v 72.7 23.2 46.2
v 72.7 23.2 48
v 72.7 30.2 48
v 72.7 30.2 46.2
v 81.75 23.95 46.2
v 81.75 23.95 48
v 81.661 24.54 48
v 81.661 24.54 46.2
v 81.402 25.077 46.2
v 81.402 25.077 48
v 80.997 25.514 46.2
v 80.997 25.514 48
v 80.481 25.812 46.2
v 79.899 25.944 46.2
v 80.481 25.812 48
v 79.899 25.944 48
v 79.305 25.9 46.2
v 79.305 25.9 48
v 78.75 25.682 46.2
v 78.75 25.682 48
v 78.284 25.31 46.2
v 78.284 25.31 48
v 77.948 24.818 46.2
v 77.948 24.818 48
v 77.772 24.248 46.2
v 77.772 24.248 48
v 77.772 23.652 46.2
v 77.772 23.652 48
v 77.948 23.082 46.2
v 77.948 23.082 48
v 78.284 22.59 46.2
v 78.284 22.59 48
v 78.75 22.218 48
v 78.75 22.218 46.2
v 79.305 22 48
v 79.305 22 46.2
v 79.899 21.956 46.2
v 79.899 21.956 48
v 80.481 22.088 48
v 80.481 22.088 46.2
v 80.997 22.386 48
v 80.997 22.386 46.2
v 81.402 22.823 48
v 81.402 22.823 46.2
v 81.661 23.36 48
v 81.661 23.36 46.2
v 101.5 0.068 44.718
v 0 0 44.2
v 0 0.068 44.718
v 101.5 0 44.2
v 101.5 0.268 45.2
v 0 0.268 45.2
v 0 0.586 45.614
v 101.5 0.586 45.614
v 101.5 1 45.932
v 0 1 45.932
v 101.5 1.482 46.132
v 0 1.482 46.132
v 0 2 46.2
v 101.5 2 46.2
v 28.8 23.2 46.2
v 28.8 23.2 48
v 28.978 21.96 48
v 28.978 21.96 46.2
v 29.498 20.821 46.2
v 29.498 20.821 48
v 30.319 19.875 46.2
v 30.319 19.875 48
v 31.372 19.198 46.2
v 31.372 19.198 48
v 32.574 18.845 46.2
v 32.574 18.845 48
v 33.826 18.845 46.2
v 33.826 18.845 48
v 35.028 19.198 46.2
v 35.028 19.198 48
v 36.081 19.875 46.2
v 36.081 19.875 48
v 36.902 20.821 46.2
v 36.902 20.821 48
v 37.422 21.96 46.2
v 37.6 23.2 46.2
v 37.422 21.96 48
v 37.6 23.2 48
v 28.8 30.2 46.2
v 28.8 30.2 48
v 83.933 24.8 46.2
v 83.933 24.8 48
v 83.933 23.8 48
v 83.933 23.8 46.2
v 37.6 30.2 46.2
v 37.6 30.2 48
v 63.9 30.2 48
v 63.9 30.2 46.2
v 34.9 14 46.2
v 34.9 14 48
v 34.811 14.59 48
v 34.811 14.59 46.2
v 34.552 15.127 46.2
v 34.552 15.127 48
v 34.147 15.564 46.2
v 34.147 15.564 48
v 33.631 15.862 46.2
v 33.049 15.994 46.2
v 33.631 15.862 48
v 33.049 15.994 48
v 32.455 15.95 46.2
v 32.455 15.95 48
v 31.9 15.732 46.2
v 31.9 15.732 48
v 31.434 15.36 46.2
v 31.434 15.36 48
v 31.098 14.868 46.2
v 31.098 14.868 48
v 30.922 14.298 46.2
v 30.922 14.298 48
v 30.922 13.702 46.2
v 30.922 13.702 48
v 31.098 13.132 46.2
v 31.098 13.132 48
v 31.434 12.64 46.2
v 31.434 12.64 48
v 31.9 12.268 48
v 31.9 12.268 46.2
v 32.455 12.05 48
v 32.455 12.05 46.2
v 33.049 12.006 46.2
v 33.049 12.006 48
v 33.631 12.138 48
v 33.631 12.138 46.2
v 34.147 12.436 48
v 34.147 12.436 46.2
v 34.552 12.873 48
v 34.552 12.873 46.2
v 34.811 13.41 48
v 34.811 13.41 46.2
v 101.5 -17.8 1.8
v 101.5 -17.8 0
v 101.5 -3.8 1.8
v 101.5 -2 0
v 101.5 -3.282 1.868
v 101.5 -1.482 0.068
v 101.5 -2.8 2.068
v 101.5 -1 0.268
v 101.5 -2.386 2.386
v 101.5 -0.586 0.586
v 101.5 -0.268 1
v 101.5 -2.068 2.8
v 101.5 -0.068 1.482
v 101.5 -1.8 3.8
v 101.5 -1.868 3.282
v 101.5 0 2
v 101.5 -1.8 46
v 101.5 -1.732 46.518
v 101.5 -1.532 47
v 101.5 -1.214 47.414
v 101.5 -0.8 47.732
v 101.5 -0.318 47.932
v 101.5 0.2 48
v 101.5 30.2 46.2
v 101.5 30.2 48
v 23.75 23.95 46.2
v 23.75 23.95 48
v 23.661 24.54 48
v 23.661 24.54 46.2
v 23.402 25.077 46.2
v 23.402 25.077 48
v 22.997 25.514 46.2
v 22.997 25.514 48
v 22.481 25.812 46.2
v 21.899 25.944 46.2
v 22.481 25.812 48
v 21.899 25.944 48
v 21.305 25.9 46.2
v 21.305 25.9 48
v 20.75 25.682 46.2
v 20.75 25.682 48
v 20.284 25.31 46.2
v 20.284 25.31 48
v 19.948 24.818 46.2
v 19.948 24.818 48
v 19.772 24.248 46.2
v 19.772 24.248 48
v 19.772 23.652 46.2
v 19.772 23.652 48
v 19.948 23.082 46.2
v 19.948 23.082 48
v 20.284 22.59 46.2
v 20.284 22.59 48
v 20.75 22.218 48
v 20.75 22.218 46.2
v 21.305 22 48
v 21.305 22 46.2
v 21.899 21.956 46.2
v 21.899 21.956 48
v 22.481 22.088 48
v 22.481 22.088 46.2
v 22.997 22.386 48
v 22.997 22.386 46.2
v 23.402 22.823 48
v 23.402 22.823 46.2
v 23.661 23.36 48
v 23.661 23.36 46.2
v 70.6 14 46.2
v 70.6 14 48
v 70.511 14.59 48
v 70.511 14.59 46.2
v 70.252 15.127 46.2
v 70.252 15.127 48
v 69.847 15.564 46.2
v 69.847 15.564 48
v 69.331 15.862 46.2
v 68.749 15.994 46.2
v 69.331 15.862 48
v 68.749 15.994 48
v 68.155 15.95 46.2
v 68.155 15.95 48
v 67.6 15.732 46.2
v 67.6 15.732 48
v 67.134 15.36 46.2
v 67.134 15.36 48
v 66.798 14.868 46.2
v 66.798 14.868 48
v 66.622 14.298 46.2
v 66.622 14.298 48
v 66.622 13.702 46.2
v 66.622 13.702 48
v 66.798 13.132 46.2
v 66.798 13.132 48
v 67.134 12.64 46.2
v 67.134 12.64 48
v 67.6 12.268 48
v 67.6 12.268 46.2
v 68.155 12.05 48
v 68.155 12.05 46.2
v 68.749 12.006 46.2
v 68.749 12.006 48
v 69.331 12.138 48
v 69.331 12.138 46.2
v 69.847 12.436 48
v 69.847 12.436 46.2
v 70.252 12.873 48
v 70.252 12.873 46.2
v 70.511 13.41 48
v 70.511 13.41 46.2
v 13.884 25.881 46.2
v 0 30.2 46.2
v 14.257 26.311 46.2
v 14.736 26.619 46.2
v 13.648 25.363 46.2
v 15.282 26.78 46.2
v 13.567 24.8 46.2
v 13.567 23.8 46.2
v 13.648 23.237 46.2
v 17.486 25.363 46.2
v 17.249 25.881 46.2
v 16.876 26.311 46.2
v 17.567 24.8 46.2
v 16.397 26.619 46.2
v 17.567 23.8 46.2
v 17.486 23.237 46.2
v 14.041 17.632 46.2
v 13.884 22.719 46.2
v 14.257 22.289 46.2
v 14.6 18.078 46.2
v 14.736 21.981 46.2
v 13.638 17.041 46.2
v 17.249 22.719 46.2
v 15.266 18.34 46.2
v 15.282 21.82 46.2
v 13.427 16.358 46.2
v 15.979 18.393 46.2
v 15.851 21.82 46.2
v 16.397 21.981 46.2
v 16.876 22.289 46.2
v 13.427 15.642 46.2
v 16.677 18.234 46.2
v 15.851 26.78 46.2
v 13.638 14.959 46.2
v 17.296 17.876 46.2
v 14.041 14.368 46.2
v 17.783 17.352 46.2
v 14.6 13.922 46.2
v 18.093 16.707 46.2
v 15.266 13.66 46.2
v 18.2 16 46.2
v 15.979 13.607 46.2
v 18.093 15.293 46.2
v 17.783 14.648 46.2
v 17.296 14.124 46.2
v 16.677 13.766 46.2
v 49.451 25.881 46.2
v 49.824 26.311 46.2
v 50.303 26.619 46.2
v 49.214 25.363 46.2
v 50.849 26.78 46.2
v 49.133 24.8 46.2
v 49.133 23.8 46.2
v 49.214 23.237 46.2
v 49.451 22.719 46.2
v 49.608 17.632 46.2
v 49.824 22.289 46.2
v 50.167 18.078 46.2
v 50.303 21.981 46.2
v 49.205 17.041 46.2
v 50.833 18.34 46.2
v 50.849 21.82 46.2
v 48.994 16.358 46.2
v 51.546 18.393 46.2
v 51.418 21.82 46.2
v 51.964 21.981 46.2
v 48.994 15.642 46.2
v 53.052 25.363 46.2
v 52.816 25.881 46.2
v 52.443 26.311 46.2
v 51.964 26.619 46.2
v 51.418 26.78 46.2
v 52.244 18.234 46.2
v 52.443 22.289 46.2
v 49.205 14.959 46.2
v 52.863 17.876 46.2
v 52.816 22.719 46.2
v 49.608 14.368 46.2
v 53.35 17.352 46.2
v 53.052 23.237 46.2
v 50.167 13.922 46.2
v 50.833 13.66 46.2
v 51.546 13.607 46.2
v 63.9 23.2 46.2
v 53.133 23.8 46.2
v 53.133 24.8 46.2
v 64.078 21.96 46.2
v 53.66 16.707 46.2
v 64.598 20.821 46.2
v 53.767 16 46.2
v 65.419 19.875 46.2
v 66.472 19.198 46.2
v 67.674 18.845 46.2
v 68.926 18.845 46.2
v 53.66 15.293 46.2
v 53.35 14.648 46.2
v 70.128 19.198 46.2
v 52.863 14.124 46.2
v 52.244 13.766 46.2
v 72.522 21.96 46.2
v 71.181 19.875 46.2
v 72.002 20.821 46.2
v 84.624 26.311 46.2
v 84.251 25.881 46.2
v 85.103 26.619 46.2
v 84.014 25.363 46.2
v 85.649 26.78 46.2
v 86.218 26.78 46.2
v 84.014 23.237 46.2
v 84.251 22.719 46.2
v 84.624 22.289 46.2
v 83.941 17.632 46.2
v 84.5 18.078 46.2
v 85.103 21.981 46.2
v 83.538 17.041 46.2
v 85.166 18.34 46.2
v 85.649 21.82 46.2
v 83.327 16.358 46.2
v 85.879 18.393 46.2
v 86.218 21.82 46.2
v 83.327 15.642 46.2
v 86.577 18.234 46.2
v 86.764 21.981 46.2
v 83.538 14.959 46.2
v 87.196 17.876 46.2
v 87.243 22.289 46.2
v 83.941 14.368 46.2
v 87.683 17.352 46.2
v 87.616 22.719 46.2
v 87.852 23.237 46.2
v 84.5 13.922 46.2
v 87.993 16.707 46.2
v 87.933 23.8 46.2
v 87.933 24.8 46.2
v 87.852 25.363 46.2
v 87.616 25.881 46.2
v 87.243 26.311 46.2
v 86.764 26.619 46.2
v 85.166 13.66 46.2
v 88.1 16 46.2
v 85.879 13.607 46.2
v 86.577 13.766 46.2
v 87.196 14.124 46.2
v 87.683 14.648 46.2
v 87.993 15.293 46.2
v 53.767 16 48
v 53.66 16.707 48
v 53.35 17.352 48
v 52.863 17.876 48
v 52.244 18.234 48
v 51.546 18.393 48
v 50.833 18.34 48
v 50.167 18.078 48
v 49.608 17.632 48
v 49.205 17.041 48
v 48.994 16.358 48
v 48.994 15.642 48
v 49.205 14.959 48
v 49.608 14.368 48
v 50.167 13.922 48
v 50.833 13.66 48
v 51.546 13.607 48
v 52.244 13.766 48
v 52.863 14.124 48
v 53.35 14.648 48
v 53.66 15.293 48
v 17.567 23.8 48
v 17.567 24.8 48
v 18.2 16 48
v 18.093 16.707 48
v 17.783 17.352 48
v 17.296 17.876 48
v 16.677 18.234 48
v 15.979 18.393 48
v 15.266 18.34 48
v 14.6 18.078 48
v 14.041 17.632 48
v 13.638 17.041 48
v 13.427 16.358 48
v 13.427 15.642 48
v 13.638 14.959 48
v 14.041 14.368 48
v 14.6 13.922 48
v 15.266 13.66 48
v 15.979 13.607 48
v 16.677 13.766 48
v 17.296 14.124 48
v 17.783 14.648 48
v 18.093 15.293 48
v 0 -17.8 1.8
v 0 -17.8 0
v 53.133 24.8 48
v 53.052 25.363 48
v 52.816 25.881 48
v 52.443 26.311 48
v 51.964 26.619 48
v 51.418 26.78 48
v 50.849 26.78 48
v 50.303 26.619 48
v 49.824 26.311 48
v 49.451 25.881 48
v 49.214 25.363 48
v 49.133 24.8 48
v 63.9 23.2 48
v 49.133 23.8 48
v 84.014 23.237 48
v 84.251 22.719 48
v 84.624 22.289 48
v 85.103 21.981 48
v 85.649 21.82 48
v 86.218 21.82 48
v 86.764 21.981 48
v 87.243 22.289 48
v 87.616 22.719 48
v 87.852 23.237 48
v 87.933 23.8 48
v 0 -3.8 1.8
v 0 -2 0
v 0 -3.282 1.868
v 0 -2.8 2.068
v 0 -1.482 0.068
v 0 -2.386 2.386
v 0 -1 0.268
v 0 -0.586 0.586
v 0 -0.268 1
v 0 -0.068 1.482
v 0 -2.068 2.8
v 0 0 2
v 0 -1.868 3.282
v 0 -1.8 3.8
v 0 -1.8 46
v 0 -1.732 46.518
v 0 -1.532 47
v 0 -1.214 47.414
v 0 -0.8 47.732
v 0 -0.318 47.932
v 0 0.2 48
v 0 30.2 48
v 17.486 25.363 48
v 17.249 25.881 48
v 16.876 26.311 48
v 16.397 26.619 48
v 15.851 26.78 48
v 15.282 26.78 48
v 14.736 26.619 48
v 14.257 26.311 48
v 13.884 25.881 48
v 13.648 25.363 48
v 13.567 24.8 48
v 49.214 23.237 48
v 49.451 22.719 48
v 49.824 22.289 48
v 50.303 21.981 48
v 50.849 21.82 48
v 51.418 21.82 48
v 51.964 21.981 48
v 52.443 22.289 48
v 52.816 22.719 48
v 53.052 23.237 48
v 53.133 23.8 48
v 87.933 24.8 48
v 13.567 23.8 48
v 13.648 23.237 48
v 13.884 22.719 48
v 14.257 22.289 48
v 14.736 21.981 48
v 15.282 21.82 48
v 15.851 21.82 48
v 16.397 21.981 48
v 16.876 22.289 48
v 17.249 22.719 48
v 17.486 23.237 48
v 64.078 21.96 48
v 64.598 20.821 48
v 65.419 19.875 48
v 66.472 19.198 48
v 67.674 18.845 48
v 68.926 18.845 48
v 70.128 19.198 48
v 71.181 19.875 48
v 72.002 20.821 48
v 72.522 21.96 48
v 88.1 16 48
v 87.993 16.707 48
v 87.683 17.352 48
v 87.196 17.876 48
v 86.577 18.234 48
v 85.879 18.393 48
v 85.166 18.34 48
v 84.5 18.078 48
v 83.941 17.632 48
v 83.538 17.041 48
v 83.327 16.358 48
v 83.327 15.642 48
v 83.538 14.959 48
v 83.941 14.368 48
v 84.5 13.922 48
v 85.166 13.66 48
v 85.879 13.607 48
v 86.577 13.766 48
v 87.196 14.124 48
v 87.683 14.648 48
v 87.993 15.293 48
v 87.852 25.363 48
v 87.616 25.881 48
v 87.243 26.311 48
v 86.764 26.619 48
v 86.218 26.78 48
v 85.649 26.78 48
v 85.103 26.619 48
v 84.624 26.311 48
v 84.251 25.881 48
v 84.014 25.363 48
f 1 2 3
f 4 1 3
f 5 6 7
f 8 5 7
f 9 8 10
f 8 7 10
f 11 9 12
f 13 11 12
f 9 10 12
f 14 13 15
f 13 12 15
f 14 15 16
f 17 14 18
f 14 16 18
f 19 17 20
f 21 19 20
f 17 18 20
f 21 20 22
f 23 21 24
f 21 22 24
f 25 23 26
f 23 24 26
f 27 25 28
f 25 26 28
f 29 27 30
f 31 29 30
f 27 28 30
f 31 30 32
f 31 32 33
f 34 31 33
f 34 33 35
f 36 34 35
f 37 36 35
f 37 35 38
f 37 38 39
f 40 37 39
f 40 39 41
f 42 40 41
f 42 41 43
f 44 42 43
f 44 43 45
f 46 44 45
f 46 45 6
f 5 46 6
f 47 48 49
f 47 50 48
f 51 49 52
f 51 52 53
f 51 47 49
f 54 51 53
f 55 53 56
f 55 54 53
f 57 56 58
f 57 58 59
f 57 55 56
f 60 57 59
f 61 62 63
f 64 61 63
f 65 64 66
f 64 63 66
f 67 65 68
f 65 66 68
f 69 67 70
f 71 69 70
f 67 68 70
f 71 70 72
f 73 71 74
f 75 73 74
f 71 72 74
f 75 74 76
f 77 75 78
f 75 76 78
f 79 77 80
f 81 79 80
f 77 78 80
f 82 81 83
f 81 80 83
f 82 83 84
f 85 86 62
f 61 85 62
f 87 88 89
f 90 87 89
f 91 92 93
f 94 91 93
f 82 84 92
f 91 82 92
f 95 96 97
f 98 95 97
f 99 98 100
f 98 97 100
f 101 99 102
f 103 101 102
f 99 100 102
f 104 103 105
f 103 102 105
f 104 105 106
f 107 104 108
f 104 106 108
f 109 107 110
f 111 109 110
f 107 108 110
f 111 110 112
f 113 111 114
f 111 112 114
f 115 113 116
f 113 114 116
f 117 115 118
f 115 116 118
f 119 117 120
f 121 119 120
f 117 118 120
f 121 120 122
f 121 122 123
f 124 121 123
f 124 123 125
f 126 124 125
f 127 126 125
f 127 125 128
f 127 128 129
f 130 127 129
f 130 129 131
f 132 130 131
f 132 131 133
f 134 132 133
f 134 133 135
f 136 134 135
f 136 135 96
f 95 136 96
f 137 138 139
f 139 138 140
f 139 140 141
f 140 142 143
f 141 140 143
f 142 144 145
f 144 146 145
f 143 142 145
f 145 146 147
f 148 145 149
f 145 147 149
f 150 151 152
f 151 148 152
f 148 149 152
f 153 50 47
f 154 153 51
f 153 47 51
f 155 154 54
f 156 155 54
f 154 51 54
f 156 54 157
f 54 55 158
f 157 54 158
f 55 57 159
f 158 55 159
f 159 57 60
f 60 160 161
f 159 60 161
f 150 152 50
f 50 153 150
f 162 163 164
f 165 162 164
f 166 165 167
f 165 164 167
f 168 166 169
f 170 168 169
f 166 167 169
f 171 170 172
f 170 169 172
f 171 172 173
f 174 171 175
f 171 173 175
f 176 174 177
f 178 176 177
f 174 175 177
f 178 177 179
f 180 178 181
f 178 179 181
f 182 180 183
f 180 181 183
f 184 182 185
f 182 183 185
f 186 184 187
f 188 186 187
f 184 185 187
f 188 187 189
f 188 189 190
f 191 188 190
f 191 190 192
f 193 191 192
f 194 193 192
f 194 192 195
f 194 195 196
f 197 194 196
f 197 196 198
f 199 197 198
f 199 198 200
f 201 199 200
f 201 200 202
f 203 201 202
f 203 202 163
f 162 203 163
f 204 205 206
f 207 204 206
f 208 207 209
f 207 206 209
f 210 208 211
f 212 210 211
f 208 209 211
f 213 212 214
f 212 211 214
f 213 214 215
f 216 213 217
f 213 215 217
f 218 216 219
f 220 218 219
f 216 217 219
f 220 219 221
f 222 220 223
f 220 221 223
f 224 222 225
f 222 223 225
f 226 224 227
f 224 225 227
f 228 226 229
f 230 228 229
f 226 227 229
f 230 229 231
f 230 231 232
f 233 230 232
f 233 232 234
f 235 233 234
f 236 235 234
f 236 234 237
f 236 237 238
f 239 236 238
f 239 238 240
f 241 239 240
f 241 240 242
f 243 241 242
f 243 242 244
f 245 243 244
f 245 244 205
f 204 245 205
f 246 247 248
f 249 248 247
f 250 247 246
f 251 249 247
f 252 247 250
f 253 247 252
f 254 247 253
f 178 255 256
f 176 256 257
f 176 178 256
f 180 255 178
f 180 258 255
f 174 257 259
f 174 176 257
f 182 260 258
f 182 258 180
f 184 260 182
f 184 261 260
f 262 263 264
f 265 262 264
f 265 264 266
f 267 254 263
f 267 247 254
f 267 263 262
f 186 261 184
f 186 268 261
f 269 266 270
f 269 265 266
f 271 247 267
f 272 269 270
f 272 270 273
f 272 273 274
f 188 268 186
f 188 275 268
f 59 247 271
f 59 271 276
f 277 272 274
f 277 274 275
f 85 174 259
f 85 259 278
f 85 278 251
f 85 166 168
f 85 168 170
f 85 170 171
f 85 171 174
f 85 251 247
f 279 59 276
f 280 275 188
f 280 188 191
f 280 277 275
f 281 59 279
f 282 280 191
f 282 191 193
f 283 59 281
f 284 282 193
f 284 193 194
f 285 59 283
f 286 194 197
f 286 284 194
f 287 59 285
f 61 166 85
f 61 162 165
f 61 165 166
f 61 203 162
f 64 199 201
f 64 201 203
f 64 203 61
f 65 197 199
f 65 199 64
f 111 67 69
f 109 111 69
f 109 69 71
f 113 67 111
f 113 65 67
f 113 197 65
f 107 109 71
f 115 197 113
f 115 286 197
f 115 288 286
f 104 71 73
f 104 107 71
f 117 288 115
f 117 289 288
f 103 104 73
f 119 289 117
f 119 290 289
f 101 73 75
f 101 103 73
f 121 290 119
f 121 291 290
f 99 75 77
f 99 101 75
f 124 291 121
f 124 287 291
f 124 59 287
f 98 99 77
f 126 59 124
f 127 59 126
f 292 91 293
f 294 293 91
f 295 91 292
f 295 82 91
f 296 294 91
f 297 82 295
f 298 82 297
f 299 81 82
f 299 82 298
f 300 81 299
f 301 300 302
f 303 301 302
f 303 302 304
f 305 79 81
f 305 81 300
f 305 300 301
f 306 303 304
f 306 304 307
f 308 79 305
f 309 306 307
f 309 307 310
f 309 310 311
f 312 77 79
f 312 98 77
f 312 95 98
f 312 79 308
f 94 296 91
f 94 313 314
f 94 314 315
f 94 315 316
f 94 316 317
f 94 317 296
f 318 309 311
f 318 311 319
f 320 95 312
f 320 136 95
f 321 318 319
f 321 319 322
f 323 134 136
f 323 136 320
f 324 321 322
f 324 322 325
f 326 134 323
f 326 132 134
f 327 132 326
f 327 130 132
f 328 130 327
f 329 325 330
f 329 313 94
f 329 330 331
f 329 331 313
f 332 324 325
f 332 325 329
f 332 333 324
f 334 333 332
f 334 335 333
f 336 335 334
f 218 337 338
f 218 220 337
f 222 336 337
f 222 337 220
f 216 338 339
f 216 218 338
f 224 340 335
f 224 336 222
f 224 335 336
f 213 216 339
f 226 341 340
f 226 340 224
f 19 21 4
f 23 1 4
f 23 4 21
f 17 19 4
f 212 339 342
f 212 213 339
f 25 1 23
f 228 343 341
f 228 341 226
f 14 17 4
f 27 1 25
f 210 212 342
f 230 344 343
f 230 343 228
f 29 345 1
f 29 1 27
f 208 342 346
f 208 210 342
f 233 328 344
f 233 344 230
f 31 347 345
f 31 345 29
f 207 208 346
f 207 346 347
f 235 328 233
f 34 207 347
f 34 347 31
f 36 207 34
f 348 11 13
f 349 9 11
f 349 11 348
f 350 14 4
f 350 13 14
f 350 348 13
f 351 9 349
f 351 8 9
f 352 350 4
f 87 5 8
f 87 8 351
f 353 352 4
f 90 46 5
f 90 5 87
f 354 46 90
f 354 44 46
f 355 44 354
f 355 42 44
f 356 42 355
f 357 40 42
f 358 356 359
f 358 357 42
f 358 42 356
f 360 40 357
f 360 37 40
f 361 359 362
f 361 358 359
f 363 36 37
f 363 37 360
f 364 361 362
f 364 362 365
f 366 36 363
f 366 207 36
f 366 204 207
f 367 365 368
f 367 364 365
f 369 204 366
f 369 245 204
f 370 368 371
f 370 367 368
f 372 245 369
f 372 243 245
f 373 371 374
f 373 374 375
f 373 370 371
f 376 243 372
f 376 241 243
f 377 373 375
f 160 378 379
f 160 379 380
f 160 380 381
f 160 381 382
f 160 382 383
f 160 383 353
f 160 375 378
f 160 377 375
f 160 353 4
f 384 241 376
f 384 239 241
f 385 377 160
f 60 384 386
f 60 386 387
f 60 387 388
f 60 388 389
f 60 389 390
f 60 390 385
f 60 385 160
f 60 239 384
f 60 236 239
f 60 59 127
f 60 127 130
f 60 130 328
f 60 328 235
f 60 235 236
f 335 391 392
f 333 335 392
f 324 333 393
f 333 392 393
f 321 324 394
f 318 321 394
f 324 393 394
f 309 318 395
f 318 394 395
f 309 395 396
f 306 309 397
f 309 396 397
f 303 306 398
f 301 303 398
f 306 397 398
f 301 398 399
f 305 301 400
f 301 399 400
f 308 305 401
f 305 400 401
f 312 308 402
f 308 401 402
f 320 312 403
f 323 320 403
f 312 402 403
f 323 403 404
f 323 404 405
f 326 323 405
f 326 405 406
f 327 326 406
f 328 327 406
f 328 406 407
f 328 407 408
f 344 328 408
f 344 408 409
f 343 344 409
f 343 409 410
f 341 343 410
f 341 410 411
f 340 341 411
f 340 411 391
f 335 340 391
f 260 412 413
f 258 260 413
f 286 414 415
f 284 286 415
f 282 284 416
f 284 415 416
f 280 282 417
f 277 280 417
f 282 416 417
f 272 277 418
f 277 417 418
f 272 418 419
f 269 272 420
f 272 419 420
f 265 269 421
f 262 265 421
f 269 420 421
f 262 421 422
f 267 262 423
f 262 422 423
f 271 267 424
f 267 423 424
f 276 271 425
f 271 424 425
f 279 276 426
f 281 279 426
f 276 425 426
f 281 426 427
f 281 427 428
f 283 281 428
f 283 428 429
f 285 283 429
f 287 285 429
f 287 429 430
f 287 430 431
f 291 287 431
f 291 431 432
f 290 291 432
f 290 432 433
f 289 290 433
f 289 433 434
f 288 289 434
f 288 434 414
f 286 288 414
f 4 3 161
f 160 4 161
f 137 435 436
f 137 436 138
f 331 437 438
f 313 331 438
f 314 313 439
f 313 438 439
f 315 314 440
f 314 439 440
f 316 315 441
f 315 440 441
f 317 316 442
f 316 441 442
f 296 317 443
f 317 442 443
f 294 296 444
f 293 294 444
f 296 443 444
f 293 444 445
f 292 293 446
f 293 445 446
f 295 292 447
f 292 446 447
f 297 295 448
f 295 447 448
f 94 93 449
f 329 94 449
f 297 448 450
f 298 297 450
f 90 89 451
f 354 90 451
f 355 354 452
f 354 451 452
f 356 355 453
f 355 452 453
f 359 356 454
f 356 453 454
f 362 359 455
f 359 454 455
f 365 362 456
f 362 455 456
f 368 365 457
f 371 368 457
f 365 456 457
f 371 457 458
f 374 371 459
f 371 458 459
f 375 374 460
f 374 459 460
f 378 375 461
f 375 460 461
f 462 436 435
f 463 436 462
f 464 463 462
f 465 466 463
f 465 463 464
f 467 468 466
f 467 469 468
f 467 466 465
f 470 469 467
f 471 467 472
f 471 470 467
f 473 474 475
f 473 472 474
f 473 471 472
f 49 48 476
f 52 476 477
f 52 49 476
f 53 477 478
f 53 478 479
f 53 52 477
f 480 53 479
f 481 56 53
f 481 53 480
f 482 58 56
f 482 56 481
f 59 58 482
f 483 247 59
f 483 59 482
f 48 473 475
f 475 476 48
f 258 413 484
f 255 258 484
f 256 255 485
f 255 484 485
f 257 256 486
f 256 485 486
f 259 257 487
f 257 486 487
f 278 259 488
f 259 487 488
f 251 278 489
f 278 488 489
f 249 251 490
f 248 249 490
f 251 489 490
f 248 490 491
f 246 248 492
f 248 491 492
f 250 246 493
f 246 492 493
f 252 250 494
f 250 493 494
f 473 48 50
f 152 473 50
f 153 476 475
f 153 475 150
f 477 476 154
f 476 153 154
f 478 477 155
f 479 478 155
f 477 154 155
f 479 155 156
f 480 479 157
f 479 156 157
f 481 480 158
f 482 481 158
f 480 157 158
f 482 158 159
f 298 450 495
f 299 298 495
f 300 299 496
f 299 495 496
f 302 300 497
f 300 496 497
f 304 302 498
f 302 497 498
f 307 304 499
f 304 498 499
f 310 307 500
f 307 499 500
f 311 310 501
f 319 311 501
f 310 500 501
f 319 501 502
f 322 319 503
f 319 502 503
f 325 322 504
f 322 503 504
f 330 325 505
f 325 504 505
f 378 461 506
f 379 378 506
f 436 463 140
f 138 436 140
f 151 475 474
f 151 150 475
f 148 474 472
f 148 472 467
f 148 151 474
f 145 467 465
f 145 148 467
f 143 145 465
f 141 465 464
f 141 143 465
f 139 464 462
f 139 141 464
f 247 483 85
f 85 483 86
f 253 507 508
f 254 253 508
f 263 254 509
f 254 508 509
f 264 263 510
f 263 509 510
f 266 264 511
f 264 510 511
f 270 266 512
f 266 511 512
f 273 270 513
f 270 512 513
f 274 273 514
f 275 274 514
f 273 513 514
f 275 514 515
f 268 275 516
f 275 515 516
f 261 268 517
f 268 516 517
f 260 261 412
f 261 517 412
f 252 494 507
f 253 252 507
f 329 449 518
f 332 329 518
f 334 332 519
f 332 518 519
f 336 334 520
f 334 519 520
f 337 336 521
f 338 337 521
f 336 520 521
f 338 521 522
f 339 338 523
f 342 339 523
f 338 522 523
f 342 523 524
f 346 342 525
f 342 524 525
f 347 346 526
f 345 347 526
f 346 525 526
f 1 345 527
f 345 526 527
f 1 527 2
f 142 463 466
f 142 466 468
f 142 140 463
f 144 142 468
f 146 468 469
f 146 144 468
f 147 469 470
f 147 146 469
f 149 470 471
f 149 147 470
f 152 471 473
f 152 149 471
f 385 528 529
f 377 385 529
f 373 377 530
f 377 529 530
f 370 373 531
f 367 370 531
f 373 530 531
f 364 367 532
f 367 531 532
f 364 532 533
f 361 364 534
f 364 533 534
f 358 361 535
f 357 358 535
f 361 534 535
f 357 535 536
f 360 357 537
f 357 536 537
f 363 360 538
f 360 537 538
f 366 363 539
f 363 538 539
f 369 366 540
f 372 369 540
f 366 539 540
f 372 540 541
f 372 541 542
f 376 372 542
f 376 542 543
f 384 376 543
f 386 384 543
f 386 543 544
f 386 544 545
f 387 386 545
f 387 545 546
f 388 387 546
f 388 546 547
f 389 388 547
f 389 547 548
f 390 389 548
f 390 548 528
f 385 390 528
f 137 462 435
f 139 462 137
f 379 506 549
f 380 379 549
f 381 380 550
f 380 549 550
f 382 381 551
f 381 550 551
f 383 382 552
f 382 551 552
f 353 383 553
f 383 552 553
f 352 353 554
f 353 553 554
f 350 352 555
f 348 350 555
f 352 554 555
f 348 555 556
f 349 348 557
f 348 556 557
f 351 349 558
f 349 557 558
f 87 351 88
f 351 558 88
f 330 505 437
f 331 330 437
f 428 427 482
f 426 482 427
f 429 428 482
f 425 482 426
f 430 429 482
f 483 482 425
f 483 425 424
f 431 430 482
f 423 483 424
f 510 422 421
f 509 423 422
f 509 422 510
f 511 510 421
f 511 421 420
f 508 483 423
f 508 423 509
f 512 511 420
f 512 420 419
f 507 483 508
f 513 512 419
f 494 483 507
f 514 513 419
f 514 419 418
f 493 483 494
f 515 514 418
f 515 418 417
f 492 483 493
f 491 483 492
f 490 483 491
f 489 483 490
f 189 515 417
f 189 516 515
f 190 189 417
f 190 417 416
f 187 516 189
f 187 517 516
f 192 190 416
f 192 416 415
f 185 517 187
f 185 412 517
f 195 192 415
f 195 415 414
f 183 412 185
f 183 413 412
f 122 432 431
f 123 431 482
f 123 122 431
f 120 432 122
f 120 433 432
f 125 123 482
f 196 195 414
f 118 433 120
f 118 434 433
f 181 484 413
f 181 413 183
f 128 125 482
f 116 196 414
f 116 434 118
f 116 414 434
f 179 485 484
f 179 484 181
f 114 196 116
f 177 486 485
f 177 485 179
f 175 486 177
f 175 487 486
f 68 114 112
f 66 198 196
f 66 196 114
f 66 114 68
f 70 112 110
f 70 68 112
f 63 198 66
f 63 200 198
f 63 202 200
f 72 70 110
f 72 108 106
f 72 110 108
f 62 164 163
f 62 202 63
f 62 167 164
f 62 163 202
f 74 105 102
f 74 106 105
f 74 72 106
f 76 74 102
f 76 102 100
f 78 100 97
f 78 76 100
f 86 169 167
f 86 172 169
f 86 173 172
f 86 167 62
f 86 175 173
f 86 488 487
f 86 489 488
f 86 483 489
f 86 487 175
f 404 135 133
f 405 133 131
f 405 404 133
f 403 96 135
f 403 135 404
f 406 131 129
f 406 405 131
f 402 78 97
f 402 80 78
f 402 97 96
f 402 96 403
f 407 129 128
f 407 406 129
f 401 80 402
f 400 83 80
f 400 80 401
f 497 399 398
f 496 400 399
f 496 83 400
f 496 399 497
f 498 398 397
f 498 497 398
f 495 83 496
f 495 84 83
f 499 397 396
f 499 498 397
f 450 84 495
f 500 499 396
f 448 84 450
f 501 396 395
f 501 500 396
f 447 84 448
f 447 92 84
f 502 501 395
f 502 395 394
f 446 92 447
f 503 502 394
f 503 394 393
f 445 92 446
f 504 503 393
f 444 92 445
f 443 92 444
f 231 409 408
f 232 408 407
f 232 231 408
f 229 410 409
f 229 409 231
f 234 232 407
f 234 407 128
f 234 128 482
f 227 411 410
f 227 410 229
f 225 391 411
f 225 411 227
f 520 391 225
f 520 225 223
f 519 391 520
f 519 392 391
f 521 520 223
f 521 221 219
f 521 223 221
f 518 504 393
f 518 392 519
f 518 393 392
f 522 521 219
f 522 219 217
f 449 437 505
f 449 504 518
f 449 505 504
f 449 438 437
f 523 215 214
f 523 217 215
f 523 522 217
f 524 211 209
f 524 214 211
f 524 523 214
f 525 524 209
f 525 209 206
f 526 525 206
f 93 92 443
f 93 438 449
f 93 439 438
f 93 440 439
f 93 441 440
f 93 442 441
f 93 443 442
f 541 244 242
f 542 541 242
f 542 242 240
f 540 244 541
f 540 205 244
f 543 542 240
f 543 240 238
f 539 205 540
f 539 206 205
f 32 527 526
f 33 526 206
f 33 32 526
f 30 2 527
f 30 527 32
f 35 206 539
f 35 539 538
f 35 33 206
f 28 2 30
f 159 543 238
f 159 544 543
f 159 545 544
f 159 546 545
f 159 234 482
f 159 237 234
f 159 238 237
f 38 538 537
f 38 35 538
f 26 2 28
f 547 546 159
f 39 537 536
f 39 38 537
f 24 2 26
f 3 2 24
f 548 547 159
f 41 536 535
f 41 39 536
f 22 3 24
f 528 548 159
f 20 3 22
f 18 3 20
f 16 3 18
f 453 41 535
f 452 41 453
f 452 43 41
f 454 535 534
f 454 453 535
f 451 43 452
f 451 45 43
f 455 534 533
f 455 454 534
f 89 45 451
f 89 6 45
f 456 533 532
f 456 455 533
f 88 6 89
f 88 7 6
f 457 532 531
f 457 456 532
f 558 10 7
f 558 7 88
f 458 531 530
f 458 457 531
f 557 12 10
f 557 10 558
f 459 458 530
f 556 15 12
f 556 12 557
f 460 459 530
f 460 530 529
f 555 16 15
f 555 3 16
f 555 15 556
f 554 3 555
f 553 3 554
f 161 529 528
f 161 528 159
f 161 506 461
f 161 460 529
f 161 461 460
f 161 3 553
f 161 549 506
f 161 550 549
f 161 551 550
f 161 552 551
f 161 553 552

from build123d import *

# Parameters (mm, degrees)
F0_W     = 101.5
F0_H     = 48
F1_DEPTH = 1.8
F2_W     = 101.5
F2_H     = 1.8
F3_DEPTH = 16
F4_DEPTH = 32
F5_R     = 2
F6_R     = 2.4
F6_R_2   = 2
F7_DEPTH = 48.001


with BuildPart() as f1:
    # F0 (on Front) → F1 (new body)
    with BuildSketch(Plane.XZ):
        with Locations((50.75, 24)):
            Rectangle(F0_W, F0_H)
    extrude(amount=F1_DEPTH)

    # F2 (on face) → F3 (join)
    with BuildSketch(Plane.XZ.offset(1.8)):
        with Locations((50.75, 0.9)):
            Rectangle(F2_W, F2_H)
    extrude(amount=F3_DEPTH)

    # F2 (on face) → F4 (join)
    with BuildSketch(Plane.XZ.offset(1.8)):
        with Locations((50.75, 47.1)):
            Rectangle(F2_W, F2_H)
    extrude(amount=-F4_DEPTH)

    # F5
    f5_edges = [f1.edges().sort_by_distance(p)[0] for p in [
        (50.75, -1.8, 48),
        (50.75, -1.8, 1.8),
        (50.75, 0, 46.2),
        (50.75, 0, 0),
    ]]
    fillet(f5_edges, radius=F5_R)

    # F6 (on face) → F7 (cut, through all)
    with BuildSketch(Plane.XY.offset(48)):
        with Locations((15.8, 16)):
            Circle(F6_R)
        with Locations((21.75, 23.95)):
            Circle(F6_R_2)
        with BuildLine():
            ThreePointArc((17.5665768757, 24.8), (15.5665768757, 26.8), (13.5665768757, 24.8))
            Line((13.5665768757, 24.8), (13.5665768757, 23.8))
            ThreePointArc((13.5665768757, 23.8), (15.5665768757, 21.8), (17.5665768757, 23.8))
            Line((17.5665768757, 23.8), (17.5665768757, 24.8))
        make_face()
        with Locations((32.9, 14)):
            Circle(F6_R_2)
        with BuildLine():
            Line((87.9334231243, 23.8), (87.9334231243, 24.8))
            ThreePointArc((87.9334231243, 24.8), (85.9334231243, 26.8), (83.9334231243, 24.8))
            Line((83.9334231243, 24.8), (83.9334231243, 23.8))
            ThreePointArc((83.9334231243, 23.8), (85.9334231243, 21.8), (87.9334231243, 23.8))
        make_face()
        with Locations((79.75, 23.95)):
            Circle(F6_R_2)
        with Locations((85.7, 16)):
            Circle(F6_R)
        with Locations((68.6, 14)):
            Circle(F6_R_2)
        with BuildLine():
            Line((53.1334231243, 23.8), (53.1334231243, 24.8))
            ThreePointArc((53.1334231243, 24.8), (51.1334231243, 26.8), (49.1334231243, 24.8))
            Line((49.1334231243, 24.8), (49.1334231243, 23.8))
            ThreePointArc((49.1334231243, 23.8), (51.1334231243, 21.8), (53.1334231243, 23.8))
        make_face()
        with Locations((51.3668462485, 16)):
            Circle(F6_R)
        with BuildLine():
            Line((37.6, 30.2), (28.8, 30.2))
            Line((28.8, 30.2), (28.8, 23.2))
            ThreePointArc((28.8, 23.2), (33.2, 18.8), (37.6, 23.2))
            Line((37.6, 23.2), (37.6, 30.2))
        make_face()
        with BuildLine():
            Line((72.7, 30.2), (63.9, 30.2))
            Line((63.9, 30.2), (63.9, 23.2))
            ThreePointArc((63.9, 23.2), (68.3, 18.8), (72.7, 23.2))
            Line((72.7, 23.2), (72.7, 30.2))
        make_face()
    extrude(amount=-F7_DEPTH, mode=Mode.SUBTRACT)


solid = f1.part
